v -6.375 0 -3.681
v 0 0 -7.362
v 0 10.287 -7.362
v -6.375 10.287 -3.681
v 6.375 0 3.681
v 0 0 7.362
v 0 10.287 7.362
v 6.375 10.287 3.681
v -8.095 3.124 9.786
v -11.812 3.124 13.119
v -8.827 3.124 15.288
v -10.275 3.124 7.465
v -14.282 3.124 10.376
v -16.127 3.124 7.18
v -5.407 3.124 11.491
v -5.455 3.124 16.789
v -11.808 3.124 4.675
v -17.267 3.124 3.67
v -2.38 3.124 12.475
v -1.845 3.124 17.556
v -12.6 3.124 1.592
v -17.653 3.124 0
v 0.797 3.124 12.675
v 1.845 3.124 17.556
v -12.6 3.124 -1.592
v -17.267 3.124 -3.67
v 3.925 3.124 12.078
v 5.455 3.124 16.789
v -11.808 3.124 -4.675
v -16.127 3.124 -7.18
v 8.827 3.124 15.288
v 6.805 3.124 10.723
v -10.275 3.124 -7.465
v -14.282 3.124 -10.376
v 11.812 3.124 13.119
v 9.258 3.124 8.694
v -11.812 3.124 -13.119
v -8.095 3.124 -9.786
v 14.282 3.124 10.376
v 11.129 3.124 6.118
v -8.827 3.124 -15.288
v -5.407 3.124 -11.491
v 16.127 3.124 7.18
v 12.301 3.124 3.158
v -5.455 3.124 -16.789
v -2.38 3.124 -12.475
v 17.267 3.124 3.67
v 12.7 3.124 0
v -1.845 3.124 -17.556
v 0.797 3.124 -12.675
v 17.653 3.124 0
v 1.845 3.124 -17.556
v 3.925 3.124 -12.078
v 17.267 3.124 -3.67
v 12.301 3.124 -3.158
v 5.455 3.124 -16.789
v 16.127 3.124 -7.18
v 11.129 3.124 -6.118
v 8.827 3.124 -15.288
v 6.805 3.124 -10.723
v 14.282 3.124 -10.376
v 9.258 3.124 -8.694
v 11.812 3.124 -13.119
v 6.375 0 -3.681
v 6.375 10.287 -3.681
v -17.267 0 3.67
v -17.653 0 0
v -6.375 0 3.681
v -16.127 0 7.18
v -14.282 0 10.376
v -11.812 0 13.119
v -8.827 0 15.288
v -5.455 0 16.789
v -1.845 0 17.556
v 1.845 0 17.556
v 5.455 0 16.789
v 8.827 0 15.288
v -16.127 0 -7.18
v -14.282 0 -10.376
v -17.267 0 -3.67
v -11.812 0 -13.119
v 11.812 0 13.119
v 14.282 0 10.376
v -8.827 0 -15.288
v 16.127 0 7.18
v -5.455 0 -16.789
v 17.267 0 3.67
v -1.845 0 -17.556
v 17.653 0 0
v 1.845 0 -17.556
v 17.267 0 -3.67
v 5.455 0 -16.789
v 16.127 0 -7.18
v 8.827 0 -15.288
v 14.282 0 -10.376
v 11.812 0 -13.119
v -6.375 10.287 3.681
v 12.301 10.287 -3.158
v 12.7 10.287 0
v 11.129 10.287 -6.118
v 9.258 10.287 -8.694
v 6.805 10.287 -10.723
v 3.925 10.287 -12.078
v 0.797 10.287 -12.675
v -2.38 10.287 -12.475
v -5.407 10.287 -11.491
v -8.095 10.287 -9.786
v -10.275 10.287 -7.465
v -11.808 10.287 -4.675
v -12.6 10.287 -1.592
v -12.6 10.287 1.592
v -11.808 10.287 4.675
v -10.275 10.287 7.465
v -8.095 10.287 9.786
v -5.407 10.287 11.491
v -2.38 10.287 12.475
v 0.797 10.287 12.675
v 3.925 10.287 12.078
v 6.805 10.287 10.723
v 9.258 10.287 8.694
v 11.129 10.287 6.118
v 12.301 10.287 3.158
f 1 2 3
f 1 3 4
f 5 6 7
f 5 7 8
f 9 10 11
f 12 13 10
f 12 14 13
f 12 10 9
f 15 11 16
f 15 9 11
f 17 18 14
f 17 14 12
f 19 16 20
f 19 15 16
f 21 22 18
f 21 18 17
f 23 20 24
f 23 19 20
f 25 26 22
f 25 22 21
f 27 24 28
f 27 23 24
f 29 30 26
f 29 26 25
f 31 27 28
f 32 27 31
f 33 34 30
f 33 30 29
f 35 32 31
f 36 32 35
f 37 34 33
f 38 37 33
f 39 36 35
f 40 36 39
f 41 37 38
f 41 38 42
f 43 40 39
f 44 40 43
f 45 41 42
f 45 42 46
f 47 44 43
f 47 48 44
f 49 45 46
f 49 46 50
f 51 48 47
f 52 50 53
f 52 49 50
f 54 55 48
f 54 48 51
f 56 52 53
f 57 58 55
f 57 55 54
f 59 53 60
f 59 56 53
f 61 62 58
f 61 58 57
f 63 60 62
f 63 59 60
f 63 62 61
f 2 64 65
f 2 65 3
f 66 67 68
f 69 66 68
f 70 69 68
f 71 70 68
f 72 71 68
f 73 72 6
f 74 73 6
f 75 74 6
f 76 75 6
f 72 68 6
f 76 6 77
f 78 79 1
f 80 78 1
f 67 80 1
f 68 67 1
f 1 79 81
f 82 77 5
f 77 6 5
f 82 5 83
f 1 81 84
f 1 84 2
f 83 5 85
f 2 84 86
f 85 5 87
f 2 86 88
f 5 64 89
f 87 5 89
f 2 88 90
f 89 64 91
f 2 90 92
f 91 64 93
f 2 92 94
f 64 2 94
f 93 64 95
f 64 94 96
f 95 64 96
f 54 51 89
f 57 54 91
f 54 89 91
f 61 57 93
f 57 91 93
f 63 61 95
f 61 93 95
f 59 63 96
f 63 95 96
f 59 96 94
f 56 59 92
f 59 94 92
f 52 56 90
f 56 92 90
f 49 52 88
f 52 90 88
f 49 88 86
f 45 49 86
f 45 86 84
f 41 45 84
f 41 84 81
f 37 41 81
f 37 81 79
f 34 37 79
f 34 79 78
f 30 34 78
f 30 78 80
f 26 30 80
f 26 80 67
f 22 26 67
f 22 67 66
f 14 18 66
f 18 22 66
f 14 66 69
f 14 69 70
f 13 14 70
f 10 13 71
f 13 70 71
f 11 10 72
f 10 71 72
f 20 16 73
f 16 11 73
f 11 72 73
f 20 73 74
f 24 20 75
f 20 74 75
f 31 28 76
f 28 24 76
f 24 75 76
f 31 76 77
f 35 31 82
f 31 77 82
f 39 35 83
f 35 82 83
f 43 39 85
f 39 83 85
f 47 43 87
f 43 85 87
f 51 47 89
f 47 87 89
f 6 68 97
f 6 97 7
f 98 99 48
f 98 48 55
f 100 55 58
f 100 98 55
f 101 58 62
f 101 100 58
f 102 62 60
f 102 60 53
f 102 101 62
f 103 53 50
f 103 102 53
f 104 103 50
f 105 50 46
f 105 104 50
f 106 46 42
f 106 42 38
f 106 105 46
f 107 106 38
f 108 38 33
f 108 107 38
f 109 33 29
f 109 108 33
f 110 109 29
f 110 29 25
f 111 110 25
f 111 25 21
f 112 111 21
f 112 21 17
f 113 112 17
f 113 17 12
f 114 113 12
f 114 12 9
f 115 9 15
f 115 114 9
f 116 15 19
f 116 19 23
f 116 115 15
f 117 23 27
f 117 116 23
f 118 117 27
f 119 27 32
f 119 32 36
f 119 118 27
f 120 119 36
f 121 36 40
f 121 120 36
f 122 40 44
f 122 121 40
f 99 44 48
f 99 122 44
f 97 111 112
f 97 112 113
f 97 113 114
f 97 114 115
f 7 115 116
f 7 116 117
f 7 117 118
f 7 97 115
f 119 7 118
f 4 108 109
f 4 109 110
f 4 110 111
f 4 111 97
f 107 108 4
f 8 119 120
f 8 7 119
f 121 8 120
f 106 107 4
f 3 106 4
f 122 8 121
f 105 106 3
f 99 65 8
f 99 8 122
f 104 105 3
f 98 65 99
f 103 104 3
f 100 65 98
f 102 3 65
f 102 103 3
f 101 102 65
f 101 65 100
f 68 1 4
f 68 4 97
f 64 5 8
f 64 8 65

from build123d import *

# Parameters (mm, degrees)
SKETCH1_R           = 17.653
BOSS_EXTRUDE1_DEPTH = 10.287
SKETCH3_R           = 23.749
SKETCH3_R_2         = 12.7
CUT_EXTRUDE2_DEPTH  = 7.1628


with BuildPart() as part:
    # Sketch1 → Boss-Extrude1 (new body)
    with BuildSketch(Plane(origin=(0, 0, 0), x_dir=(1, 0, 0), z_dir=(0, 1, 0))):
        Circle(SKETCH1_R)
        Polygon((0, 7.361677812), (-6.3754, 3.680838906), (-6.3754, -3.680838906), (0, -7.361677812), (6.3754, -3.680838906), (6.3754, 3.680838906), align=None, mode=Mode.SUBTRACT)
    extrude(amount=BOSS_EXTRUDE1_DEPTH)

    # Sketch3 → Cut-Extrude2 (cut)
    with BuildSketch(Plane(origin=(0, 10.287, 0), x_dir=(1, 0, 0), z_dir=(0, 1, 0))):
        Circle(SKETCH3_R)
        Circle(SKETCH3_R_2, mode=Mode.SUBTRACT)
    extrude(amount=-CUT_EXTRUDE2_DEPTH, mode=Mode.SUBTRACT)


solid = part.part
